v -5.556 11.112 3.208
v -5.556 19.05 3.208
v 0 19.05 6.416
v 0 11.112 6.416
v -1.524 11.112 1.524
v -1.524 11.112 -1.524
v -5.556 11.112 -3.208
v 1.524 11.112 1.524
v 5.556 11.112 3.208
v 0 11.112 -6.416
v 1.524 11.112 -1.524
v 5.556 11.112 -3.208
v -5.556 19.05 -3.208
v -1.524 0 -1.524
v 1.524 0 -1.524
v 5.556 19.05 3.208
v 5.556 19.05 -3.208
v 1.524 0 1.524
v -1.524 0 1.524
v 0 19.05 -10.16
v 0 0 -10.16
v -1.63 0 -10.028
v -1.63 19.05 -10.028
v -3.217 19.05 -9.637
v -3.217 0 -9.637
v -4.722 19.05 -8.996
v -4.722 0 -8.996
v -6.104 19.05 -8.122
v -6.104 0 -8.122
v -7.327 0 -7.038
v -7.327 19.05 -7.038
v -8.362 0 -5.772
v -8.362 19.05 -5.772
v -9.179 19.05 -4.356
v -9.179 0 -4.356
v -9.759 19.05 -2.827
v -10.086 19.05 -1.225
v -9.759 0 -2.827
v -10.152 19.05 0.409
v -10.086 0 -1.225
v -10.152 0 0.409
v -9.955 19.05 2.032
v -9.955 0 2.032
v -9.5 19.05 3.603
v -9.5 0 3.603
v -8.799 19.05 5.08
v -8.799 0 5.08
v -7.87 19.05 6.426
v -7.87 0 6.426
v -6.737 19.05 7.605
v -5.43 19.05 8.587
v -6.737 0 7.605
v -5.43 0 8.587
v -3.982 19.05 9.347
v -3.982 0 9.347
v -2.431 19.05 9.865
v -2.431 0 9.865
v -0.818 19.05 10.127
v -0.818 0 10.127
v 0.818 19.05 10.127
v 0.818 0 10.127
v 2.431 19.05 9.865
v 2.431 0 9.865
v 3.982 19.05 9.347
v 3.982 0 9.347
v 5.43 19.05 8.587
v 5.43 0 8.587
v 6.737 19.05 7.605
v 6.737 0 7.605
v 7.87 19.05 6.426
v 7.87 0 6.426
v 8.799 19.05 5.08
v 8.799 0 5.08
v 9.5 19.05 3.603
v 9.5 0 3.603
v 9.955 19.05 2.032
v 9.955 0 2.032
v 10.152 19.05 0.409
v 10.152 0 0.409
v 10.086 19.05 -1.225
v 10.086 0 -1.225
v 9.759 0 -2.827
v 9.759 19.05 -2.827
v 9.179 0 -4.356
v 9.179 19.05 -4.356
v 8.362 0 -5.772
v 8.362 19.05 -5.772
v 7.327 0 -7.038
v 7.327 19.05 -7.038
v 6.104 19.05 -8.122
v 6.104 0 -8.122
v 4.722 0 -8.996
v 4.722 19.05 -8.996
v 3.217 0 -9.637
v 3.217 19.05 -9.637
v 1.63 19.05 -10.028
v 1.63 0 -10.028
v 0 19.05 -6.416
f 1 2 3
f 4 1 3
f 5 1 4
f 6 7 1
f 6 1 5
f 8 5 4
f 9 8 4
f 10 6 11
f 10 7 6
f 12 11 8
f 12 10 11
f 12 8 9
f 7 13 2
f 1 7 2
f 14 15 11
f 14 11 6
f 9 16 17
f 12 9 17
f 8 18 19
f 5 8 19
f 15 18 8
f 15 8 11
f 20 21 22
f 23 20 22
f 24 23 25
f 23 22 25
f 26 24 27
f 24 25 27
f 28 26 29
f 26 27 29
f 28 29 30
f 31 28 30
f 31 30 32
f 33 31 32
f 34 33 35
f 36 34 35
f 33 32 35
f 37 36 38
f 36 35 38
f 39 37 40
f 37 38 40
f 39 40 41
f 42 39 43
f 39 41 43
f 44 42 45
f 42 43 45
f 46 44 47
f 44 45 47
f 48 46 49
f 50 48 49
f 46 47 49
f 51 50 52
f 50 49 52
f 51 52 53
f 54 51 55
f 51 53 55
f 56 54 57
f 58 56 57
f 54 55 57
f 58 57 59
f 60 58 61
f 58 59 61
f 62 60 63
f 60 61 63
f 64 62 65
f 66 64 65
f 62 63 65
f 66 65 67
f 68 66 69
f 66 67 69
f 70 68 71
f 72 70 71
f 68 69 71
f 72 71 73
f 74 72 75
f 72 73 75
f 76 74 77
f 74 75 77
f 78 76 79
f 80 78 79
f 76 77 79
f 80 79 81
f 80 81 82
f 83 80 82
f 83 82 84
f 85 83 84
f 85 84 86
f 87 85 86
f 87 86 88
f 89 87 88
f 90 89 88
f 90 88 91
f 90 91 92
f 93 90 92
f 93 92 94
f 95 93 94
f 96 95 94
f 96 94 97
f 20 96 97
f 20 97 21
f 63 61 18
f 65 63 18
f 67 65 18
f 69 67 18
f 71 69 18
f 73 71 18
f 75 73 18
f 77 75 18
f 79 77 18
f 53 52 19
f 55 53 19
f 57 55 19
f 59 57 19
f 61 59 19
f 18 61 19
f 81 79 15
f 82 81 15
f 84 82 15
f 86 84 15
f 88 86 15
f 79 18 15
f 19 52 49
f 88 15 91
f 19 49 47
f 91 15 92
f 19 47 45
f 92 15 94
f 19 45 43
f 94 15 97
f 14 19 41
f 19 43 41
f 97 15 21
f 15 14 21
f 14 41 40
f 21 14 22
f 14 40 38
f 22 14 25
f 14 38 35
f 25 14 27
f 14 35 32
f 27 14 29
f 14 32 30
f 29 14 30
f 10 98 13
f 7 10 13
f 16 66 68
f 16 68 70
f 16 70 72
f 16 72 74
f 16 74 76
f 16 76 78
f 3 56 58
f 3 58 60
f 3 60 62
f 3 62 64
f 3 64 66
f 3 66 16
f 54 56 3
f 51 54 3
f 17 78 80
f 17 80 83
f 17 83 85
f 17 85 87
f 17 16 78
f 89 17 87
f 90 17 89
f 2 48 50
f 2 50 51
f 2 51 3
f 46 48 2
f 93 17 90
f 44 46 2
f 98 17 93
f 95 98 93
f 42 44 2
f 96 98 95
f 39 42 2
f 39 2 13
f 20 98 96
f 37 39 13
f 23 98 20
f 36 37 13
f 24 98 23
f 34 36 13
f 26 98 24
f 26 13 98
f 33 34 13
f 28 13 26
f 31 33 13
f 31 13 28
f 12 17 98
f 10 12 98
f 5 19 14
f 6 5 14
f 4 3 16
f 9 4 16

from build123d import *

# Parameters (mm, degrees)
SKETCH1_R           = 10.16
BOSS_EXTRUDE1_DEPTH = 19.05
CUT_EXTRUDE1_DEPTH  = 7.9375
SKETCH2_W           = 3.048
SKETCH2_H           = 3.048
CUT_EXTRUDE2_DEPTH  = 11.1125


with BuildPart() as part:
    # Sketch1 → Boss-Extrude1 (new body)
    with BuildSketch(Plane(origin=(0, 0, 0), x_dir=(1, 0, 0), z_dir=(0, 1, 0))):
        with Locations(Location((0, 0, 0), (0, 0, 90))):
            Circle(SKETCH1_R)
    extrude(amount=BOSS_EXTRUDE1_DEPTH)

    # Sketch3 → Cut-Extrude1 (cut)
    with BuildSketch(Plane(origin=(0, 19.05, 0), x_dir=(1, 0, 0), z_dir=(0, 1, 0))):
        Polygon((0, -6.415804866), (5.55625, -3.207902433), (5.55625, 3.207902433), (0, 6.415804866), (-5.55625, 3.207902433), (-5.55625, -3.207902433), align=None)
    extrude(amount=-CUT_EXTRUDE1_DEPTH, mode=Mode.SUBTRACT)

    # Sketch2 → Cut-Extrude2 (cut)
    with BuildSketch(Plane(origin=(0, 0, 0), x_dir=(-1, 0, 0), z_dir=(0, -1, 0))):
        Rectangle(SKETCH2_W, SKETCH2_H)
    extrude(amount=-CUT_EXTRUDE2_DEPTH, mode=Mode.SUBTRACT)


solid = part.part
